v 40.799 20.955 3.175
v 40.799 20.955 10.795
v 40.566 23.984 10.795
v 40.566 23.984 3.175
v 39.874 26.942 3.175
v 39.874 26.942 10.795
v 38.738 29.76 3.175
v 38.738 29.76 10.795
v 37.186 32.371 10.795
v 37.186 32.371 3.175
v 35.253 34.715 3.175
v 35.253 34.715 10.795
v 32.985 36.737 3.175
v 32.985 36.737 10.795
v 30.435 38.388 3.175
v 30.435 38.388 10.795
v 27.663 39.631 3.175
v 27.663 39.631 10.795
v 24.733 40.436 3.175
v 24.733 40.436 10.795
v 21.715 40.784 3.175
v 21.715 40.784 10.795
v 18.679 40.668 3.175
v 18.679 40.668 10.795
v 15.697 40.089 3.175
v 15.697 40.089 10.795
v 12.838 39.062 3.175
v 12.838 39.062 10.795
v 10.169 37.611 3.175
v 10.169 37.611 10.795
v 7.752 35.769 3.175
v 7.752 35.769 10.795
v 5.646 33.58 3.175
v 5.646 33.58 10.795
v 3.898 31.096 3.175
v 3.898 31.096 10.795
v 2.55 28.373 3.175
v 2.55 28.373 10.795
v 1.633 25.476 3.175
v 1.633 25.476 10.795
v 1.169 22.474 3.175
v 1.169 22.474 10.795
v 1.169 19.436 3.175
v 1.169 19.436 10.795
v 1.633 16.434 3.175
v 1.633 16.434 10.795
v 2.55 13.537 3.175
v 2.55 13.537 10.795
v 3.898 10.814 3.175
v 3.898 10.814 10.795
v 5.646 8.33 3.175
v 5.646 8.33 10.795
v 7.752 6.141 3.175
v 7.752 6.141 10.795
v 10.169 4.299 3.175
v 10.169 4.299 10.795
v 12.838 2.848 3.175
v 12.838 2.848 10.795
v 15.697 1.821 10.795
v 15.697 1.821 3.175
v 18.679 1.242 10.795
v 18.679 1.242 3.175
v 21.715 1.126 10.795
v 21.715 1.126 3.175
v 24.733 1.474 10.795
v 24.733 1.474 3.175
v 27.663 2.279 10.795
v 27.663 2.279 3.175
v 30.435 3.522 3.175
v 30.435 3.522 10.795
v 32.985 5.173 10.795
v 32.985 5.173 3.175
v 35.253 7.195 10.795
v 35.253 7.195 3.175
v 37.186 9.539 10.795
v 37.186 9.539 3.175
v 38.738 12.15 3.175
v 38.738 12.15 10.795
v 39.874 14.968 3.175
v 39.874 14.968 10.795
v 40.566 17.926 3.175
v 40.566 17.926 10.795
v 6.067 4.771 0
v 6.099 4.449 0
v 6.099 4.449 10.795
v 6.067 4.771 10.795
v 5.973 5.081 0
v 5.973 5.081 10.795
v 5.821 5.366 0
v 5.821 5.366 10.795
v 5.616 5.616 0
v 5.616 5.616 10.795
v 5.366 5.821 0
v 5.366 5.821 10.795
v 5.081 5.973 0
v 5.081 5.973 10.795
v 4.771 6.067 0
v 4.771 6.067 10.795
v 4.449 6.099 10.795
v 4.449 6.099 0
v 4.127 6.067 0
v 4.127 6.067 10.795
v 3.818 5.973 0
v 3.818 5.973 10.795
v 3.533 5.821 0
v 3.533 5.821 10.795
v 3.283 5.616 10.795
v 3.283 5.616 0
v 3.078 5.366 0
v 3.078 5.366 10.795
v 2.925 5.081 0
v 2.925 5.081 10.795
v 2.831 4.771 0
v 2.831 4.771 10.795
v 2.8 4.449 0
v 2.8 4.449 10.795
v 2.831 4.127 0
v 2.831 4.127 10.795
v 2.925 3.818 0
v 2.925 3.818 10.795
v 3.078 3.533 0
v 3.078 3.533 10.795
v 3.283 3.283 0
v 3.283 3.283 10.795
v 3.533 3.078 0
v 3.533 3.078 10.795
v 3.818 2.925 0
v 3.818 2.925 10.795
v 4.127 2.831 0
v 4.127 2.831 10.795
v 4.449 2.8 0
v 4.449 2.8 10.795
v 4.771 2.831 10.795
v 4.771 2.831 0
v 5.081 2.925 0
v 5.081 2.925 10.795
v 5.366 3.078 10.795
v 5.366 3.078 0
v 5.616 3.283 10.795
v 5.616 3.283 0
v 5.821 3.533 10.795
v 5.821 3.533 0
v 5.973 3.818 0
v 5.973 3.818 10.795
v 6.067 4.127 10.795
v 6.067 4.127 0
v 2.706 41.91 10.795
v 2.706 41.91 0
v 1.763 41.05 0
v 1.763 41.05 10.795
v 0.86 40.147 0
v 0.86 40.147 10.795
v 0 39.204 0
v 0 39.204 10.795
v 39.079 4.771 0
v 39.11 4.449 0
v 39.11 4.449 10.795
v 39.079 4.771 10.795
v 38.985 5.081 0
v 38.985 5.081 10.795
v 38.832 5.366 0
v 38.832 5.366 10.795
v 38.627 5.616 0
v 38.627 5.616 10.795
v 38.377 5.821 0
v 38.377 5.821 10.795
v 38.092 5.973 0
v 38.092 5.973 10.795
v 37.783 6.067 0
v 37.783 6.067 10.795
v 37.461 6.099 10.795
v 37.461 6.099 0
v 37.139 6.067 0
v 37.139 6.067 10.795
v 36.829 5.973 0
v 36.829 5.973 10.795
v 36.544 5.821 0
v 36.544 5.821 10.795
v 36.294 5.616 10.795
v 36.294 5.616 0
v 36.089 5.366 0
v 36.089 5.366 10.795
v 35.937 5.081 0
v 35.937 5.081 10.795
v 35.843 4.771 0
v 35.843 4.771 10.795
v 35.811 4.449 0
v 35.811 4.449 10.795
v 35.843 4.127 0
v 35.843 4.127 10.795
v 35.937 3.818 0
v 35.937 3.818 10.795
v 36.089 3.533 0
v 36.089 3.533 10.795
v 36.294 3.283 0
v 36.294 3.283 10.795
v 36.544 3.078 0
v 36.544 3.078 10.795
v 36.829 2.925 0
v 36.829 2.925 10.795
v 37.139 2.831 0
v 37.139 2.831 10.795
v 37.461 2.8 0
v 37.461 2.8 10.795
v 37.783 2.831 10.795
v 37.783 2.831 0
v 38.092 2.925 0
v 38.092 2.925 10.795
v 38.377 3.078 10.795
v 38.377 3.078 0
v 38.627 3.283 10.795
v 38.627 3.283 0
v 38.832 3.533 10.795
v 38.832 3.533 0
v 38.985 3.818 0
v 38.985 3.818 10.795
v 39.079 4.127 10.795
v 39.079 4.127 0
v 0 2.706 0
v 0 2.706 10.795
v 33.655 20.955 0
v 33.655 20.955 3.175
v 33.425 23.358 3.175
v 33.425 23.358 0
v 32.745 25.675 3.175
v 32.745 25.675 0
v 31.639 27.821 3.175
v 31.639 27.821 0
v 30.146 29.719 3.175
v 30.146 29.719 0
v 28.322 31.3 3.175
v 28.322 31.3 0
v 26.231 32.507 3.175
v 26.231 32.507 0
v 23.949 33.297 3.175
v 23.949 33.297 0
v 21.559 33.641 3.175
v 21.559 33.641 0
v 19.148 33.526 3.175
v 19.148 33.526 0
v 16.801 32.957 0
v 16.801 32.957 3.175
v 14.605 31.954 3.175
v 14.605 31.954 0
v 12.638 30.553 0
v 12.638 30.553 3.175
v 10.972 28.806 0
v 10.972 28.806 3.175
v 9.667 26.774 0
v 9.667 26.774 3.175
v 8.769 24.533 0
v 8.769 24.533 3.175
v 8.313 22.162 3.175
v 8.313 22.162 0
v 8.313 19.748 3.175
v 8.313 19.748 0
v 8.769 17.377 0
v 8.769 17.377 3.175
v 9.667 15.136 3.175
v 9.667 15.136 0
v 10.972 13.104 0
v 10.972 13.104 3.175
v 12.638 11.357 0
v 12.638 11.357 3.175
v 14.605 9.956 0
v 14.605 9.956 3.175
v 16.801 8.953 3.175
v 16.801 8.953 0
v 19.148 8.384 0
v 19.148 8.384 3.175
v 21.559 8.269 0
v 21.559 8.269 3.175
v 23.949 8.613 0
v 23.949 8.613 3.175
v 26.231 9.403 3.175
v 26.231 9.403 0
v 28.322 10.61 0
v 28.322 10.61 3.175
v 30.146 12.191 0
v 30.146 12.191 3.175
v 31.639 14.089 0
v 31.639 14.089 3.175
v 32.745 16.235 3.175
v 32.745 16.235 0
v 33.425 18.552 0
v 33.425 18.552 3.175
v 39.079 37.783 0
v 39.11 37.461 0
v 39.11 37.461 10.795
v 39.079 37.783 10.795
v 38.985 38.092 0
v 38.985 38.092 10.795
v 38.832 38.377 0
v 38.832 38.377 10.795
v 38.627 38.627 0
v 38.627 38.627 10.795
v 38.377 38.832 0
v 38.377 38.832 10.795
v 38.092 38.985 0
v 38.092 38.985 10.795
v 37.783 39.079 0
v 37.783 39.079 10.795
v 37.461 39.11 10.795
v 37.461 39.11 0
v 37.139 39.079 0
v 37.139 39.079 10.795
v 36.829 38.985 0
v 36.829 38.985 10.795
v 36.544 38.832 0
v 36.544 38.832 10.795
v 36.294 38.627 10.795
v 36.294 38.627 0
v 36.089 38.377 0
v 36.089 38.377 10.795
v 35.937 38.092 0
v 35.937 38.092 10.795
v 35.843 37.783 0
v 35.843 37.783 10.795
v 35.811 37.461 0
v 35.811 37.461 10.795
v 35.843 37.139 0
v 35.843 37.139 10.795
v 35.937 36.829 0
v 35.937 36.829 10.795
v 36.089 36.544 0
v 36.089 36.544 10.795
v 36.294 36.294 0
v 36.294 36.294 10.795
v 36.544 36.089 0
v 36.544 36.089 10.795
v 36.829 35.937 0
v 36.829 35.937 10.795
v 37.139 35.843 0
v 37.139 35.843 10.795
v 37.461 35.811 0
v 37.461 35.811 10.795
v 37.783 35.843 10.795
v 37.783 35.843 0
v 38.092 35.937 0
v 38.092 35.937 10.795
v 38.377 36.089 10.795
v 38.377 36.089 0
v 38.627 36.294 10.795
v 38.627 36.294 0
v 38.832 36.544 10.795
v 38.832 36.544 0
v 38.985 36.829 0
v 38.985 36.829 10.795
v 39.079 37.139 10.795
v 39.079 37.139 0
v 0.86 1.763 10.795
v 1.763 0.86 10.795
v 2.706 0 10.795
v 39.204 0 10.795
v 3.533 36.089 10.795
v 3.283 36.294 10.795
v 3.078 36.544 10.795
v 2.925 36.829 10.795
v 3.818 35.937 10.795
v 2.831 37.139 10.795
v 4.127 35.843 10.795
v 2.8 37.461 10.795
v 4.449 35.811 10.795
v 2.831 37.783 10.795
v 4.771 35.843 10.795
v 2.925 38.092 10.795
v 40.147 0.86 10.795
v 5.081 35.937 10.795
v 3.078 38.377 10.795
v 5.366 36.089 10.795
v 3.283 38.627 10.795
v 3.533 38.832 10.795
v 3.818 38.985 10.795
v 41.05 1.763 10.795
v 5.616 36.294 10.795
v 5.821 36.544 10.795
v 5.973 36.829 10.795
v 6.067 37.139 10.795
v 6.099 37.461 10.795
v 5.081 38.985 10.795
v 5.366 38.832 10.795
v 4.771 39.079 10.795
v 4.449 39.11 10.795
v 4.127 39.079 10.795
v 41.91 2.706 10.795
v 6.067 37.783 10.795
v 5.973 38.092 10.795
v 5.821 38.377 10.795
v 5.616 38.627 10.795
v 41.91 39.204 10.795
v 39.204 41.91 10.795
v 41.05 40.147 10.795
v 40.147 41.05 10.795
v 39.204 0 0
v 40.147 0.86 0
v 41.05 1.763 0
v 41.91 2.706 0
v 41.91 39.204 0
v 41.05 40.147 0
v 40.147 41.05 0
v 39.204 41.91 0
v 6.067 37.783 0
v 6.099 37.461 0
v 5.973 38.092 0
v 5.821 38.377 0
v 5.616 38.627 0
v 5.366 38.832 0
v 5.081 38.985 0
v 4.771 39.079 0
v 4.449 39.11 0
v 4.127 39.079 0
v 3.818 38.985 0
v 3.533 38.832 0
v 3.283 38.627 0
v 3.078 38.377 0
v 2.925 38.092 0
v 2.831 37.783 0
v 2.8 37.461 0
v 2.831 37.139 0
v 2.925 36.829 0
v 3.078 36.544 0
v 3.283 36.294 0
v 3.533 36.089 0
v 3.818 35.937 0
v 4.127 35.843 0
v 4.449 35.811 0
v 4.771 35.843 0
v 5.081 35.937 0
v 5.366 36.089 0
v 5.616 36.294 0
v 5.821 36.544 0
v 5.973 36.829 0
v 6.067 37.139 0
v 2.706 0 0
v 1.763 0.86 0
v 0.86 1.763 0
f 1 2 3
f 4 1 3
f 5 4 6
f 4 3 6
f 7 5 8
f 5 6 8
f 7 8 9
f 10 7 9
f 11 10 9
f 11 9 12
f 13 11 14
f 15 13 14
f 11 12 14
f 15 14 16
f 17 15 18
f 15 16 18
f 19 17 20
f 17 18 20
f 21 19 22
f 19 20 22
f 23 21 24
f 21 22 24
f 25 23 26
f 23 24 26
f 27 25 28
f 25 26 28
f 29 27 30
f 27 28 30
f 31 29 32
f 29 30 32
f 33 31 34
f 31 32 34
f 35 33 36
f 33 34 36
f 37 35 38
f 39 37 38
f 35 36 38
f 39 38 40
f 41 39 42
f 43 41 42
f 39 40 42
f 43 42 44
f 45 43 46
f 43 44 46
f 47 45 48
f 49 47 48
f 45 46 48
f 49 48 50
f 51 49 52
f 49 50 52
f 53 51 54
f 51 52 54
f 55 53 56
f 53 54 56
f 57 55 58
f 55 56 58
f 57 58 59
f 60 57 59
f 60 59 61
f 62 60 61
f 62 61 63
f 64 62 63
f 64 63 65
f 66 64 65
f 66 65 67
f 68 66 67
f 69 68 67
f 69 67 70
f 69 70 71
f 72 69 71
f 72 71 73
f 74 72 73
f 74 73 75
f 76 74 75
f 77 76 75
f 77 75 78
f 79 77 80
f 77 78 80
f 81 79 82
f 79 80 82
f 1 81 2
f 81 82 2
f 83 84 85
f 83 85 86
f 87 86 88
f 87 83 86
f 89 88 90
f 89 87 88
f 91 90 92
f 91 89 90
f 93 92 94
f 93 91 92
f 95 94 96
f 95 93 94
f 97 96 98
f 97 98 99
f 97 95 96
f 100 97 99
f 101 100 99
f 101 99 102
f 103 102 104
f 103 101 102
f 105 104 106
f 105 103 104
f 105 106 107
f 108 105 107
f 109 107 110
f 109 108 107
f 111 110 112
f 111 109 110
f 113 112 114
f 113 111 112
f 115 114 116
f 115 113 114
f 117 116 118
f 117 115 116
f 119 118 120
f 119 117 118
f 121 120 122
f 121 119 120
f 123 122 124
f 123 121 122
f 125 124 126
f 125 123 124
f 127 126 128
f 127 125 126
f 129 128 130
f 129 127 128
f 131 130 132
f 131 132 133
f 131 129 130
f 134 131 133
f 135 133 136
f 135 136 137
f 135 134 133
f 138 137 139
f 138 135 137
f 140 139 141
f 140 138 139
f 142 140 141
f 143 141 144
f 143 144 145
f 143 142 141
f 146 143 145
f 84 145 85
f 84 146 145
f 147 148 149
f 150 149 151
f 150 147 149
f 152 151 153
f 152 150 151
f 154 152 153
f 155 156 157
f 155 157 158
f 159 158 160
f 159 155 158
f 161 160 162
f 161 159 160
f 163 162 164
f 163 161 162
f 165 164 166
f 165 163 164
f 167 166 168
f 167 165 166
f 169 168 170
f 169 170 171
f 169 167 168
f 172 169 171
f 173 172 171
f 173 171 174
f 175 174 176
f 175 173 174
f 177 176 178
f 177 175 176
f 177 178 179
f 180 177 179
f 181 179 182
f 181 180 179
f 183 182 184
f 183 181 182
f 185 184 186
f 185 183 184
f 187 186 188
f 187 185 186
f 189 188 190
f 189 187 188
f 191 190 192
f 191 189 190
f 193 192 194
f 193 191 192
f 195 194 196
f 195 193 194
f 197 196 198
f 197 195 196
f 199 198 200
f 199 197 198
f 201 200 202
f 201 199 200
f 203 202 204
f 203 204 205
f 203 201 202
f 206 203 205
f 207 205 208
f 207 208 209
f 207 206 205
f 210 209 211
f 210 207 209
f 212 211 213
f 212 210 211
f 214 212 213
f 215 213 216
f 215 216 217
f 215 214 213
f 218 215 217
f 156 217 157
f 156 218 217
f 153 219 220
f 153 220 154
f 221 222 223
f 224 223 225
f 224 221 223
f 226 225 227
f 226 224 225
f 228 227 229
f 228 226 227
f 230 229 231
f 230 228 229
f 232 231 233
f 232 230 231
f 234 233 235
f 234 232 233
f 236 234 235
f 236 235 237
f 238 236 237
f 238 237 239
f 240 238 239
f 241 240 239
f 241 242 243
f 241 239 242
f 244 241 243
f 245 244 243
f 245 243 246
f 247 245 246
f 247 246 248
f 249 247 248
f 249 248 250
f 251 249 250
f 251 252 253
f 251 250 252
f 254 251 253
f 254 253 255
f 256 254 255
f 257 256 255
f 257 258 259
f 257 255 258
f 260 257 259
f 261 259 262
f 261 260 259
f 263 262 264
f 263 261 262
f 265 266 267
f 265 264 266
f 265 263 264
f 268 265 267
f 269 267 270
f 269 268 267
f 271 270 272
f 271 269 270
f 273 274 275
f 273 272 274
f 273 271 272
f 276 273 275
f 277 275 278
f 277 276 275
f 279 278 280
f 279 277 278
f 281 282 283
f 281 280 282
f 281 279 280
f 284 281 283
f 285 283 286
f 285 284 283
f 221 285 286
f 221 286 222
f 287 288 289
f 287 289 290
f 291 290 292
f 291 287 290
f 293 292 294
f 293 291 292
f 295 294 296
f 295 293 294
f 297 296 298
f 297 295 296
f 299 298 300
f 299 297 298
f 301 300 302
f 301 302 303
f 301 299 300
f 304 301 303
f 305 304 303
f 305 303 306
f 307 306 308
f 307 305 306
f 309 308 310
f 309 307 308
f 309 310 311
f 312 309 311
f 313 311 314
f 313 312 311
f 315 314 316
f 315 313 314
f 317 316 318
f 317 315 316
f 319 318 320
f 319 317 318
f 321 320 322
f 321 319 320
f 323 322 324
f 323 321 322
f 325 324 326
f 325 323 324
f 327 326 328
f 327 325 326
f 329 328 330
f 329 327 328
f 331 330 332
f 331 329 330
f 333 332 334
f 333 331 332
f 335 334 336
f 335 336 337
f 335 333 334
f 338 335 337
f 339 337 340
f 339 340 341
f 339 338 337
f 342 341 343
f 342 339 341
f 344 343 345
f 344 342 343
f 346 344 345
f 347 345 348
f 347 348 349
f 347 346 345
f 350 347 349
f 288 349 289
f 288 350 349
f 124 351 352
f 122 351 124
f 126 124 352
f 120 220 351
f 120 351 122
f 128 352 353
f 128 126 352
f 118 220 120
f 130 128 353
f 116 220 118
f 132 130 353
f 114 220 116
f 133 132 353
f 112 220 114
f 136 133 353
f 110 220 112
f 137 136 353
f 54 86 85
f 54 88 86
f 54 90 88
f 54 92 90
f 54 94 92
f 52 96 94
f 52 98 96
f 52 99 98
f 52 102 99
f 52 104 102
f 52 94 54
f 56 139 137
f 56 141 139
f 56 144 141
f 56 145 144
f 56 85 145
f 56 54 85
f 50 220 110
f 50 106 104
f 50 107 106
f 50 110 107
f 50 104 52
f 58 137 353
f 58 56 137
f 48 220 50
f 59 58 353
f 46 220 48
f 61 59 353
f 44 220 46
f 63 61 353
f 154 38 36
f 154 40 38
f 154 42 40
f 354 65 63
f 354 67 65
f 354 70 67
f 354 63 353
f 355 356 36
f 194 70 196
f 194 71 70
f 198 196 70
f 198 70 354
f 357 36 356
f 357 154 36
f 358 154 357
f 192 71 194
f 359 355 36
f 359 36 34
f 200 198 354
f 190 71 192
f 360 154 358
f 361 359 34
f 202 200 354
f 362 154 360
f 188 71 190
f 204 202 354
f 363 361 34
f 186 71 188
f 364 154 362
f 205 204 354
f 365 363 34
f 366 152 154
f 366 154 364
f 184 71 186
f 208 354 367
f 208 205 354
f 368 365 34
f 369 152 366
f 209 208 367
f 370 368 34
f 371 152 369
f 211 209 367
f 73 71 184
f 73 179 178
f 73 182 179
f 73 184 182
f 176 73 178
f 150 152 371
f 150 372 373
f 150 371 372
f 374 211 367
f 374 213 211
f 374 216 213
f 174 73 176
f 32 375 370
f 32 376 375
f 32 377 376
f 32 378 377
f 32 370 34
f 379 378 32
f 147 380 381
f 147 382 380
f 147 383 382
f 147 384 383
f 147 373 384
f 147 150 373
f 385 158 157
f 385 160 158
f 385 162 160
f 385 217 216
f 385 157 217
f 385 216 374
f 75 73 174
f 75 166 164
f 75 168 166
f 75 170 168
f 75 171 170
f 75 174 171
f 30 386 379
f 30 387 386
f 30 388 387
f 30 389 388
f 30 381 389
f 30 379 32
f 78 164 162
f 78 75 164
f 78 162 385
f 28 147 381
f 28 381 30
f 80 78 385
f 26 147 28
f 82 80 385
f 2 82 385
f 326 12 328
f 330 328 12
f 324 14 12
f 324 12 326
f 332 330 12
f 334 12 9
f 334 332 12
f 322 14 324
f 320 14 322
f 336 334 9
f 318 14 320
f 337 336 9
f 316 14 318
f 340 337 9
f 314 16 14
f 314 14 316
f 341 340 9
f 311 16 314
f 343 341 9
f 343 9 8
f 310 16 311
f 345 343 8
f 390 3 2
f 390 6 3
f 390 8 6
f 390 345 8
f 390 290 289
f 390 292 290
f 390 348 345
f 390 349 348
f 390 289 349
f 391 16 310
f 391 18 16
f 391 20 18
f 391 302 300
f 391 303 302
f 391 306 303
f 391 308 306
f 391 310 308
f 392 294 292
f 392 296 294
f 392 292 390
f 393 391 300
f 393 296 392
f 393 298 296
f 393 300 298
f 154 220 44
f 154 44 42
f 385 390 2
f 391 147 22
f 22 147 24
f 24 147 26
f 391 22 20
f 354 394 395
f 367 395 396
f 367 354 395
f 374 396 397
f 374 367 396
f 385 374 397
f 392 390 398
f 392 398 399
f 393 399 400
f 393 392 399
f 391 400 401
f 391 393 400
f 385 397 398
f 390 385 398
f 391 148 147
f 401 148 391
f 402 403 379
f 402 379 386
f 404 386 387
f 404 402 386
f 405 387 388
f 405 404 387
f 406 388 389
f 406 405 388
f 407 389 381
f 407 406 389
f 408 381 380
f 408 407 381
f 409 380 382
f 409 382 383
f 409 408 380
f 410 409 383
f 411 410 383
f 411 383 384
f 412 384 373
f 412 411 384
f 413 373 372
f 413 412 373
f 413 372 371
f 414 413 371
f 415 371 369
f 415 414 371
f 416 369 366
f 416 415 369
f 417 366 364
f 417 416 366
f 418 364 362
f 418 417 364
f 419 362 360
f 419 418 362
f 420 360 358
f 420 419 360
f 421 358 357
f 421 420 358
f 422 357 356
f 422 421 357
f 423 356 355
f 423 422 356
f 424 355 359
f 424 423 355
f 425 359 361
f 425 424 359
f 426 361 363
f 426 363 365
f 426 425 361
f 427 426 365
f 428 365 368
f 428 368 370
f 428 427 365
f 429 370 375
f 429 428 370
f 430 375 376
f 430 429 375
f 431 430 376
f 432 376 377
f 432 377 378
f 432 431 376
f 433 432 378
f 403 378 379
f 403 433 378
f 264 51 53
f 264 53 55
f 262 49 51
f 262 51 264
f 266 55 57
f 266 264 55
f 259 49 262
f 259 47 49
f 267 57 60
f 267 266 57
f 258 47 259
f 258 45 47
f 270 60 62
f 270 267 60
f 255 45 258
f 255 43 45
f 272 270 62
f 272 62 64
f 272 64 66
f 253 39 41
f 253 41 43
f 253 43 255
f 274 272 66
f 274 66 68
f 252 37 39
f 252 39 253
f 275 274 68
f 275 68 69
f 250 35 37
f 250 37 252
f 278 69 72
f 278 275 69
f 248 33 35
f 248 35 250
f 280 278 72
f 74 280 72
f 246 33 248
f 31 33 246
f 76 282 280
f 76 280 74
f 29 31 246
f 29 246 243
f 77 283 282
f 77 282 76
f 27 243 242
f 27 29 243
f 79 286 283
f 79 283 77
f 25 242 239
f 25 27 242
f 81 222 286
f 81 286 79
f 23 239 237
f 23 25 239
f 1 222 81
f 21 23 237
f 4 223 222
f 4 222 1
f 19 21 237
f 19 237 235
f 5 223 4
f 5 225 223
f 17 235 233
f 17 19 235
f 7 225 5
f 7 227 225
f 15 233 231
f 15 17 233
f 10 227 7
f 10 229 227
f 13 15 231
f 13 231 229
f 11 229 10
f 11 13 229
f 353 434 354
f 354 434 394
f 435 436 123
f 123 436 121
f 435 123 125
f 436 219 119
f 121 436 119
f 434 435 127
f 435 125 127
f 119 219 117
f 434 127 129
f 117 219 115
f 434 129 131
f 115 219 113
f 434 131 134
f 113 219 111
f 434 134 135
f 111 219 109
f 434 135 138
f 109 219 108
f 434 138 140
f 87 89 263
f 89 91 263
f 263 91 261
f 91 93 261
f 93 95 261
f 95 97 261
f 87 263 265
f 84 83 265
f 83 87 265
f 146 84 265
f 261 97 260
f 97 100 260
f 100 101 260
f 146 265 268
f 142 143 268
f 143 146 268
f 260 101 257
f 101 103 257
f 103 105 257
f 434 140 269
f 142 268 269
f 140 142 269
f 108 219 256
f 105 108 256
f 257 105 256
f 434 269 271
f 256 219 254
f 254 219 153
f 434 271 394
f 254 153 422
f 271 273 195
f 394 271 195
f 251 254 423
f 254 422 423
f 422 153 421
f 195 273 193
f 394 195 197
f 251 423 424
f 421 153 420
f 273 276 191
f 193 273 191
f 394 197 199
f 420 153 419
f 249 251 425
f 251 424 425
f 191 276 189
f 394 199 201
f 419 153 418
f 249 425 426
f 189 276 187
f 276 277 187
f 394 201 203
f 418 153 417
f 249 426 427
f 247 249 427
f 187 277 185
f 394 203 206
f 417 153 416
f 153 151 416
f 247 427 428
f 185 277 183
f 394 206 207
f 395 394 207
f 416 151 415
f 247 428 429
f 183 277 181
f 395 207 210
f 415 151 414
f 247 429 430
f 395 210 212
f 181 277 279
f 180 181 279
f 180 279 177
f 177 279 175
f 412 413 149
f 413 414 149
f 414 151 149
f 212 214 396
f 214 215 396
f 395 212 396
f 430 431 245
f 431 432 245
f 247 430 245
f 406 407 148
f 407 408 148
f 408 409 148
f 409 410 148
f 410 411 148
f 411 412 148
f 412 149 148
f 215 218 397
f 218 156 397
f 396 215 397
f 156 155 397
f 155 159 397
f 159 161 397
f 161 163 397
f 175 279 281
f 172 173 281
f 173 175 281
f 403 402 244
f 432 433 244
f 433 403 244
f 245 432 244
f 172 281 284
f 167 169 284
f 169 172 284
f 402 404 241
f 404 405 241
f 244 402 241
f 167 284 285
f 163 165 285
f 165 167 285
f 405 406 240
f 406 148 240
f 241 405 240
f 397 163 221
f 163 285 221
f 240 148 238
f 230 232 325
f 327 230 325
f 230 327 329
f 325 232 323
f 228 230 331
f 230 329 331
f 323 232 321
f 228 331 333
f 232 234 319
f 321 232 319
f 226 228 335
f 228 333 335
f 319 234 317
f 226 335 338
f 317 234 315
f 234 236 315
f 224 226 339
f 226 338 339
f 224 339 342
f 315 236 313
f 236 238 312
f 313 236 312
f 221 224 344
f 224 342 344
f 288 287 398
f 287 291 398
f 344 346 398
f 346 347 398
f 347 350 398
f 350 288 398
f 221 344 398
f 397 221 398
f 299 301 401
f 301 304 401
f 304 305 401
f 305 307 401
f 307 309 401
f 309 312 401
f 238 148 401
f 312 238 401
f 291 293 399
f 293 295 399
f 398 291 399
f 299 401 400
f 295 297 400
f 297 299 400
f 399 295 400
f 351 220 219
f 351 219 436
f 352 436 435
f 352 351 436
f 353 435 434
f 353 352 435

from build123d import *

# Parameters (mm, degrees)
SKETCH1_W           = 41.91
SKETCH1_H           = 41.91
SKETCH1_R           = 1.64973
SKETCH1_R_2         = 12.7
BOSS_EXTRUDE1_DEPTH = 10.795
SKETCH2_R           = 62.565718238
SKETCH2_R_2         = 27.7876
CUT_EXTRUDE1_DEPTH  = 61.244736077
SKETCH3_R           = 19.84375
CUT_EXTRUDE2_DEPTH  = 7.62


with BuildPart() as part:
    # Sketch1 → Boss-Extrude1 (new body)
    with BuildSketch(Plane.XY):
        with Locations((20.955, 20.955)):
            Rectangle(SKETCH1_W, SKETCH1_H)
        with Locations((37.460710751, 37.460710751)):
            Circle(SKETCH1_R, mode=Mode.SUBTRACT)
        with Locations((37.460710751, 4.449289249)):
            Circle(SKETCH1_R, mode=Mode.SUBTRACT)
        with Locations((4.449289249, 4.449289249)):
            Circle(SKETCH1_R, mode=Mode.SUBTRACT)
        with Locations((4.449289249, 37.460710751)):
            Circle(SKETCH1_R, mode=Mode.SUBTRACT)
        with Locations((20.955, 20.955)):
            Circle(SKETCH1_R_2, mode=Mode.SUBTRACT)
    extrude(amount=BOSS_EXTRUDE1_DEPTH)

    # Sketch2 → Cut-Extrude1 (cut, through all)
    with BuildSketch(Plane.XY.offset(10.795)):
        with Locations((20.955, 20.955)):
            Circle(SKETCH2_R)
        with Locations((20.955, 20.955)):
            Circle(SKETCH2_R_2, mode=Mode.SUBTRACT)
    extrude(amount=-CUT_EXTRUDE1_DEPTH, mode=Mode.SUBTRACT)

    # Sketch3 → Cut-Extrude2 (cut)
    with BuildSketch(Plane.XY.offset(10.795)):
        with Locations((20.955, 20.955)):
            Circle(SKETCH3_R)
    extrude(amount=-CUT_EXTRUDE2_DEPTH, mode=Mode.SUBTRACT)


solid = part.part
